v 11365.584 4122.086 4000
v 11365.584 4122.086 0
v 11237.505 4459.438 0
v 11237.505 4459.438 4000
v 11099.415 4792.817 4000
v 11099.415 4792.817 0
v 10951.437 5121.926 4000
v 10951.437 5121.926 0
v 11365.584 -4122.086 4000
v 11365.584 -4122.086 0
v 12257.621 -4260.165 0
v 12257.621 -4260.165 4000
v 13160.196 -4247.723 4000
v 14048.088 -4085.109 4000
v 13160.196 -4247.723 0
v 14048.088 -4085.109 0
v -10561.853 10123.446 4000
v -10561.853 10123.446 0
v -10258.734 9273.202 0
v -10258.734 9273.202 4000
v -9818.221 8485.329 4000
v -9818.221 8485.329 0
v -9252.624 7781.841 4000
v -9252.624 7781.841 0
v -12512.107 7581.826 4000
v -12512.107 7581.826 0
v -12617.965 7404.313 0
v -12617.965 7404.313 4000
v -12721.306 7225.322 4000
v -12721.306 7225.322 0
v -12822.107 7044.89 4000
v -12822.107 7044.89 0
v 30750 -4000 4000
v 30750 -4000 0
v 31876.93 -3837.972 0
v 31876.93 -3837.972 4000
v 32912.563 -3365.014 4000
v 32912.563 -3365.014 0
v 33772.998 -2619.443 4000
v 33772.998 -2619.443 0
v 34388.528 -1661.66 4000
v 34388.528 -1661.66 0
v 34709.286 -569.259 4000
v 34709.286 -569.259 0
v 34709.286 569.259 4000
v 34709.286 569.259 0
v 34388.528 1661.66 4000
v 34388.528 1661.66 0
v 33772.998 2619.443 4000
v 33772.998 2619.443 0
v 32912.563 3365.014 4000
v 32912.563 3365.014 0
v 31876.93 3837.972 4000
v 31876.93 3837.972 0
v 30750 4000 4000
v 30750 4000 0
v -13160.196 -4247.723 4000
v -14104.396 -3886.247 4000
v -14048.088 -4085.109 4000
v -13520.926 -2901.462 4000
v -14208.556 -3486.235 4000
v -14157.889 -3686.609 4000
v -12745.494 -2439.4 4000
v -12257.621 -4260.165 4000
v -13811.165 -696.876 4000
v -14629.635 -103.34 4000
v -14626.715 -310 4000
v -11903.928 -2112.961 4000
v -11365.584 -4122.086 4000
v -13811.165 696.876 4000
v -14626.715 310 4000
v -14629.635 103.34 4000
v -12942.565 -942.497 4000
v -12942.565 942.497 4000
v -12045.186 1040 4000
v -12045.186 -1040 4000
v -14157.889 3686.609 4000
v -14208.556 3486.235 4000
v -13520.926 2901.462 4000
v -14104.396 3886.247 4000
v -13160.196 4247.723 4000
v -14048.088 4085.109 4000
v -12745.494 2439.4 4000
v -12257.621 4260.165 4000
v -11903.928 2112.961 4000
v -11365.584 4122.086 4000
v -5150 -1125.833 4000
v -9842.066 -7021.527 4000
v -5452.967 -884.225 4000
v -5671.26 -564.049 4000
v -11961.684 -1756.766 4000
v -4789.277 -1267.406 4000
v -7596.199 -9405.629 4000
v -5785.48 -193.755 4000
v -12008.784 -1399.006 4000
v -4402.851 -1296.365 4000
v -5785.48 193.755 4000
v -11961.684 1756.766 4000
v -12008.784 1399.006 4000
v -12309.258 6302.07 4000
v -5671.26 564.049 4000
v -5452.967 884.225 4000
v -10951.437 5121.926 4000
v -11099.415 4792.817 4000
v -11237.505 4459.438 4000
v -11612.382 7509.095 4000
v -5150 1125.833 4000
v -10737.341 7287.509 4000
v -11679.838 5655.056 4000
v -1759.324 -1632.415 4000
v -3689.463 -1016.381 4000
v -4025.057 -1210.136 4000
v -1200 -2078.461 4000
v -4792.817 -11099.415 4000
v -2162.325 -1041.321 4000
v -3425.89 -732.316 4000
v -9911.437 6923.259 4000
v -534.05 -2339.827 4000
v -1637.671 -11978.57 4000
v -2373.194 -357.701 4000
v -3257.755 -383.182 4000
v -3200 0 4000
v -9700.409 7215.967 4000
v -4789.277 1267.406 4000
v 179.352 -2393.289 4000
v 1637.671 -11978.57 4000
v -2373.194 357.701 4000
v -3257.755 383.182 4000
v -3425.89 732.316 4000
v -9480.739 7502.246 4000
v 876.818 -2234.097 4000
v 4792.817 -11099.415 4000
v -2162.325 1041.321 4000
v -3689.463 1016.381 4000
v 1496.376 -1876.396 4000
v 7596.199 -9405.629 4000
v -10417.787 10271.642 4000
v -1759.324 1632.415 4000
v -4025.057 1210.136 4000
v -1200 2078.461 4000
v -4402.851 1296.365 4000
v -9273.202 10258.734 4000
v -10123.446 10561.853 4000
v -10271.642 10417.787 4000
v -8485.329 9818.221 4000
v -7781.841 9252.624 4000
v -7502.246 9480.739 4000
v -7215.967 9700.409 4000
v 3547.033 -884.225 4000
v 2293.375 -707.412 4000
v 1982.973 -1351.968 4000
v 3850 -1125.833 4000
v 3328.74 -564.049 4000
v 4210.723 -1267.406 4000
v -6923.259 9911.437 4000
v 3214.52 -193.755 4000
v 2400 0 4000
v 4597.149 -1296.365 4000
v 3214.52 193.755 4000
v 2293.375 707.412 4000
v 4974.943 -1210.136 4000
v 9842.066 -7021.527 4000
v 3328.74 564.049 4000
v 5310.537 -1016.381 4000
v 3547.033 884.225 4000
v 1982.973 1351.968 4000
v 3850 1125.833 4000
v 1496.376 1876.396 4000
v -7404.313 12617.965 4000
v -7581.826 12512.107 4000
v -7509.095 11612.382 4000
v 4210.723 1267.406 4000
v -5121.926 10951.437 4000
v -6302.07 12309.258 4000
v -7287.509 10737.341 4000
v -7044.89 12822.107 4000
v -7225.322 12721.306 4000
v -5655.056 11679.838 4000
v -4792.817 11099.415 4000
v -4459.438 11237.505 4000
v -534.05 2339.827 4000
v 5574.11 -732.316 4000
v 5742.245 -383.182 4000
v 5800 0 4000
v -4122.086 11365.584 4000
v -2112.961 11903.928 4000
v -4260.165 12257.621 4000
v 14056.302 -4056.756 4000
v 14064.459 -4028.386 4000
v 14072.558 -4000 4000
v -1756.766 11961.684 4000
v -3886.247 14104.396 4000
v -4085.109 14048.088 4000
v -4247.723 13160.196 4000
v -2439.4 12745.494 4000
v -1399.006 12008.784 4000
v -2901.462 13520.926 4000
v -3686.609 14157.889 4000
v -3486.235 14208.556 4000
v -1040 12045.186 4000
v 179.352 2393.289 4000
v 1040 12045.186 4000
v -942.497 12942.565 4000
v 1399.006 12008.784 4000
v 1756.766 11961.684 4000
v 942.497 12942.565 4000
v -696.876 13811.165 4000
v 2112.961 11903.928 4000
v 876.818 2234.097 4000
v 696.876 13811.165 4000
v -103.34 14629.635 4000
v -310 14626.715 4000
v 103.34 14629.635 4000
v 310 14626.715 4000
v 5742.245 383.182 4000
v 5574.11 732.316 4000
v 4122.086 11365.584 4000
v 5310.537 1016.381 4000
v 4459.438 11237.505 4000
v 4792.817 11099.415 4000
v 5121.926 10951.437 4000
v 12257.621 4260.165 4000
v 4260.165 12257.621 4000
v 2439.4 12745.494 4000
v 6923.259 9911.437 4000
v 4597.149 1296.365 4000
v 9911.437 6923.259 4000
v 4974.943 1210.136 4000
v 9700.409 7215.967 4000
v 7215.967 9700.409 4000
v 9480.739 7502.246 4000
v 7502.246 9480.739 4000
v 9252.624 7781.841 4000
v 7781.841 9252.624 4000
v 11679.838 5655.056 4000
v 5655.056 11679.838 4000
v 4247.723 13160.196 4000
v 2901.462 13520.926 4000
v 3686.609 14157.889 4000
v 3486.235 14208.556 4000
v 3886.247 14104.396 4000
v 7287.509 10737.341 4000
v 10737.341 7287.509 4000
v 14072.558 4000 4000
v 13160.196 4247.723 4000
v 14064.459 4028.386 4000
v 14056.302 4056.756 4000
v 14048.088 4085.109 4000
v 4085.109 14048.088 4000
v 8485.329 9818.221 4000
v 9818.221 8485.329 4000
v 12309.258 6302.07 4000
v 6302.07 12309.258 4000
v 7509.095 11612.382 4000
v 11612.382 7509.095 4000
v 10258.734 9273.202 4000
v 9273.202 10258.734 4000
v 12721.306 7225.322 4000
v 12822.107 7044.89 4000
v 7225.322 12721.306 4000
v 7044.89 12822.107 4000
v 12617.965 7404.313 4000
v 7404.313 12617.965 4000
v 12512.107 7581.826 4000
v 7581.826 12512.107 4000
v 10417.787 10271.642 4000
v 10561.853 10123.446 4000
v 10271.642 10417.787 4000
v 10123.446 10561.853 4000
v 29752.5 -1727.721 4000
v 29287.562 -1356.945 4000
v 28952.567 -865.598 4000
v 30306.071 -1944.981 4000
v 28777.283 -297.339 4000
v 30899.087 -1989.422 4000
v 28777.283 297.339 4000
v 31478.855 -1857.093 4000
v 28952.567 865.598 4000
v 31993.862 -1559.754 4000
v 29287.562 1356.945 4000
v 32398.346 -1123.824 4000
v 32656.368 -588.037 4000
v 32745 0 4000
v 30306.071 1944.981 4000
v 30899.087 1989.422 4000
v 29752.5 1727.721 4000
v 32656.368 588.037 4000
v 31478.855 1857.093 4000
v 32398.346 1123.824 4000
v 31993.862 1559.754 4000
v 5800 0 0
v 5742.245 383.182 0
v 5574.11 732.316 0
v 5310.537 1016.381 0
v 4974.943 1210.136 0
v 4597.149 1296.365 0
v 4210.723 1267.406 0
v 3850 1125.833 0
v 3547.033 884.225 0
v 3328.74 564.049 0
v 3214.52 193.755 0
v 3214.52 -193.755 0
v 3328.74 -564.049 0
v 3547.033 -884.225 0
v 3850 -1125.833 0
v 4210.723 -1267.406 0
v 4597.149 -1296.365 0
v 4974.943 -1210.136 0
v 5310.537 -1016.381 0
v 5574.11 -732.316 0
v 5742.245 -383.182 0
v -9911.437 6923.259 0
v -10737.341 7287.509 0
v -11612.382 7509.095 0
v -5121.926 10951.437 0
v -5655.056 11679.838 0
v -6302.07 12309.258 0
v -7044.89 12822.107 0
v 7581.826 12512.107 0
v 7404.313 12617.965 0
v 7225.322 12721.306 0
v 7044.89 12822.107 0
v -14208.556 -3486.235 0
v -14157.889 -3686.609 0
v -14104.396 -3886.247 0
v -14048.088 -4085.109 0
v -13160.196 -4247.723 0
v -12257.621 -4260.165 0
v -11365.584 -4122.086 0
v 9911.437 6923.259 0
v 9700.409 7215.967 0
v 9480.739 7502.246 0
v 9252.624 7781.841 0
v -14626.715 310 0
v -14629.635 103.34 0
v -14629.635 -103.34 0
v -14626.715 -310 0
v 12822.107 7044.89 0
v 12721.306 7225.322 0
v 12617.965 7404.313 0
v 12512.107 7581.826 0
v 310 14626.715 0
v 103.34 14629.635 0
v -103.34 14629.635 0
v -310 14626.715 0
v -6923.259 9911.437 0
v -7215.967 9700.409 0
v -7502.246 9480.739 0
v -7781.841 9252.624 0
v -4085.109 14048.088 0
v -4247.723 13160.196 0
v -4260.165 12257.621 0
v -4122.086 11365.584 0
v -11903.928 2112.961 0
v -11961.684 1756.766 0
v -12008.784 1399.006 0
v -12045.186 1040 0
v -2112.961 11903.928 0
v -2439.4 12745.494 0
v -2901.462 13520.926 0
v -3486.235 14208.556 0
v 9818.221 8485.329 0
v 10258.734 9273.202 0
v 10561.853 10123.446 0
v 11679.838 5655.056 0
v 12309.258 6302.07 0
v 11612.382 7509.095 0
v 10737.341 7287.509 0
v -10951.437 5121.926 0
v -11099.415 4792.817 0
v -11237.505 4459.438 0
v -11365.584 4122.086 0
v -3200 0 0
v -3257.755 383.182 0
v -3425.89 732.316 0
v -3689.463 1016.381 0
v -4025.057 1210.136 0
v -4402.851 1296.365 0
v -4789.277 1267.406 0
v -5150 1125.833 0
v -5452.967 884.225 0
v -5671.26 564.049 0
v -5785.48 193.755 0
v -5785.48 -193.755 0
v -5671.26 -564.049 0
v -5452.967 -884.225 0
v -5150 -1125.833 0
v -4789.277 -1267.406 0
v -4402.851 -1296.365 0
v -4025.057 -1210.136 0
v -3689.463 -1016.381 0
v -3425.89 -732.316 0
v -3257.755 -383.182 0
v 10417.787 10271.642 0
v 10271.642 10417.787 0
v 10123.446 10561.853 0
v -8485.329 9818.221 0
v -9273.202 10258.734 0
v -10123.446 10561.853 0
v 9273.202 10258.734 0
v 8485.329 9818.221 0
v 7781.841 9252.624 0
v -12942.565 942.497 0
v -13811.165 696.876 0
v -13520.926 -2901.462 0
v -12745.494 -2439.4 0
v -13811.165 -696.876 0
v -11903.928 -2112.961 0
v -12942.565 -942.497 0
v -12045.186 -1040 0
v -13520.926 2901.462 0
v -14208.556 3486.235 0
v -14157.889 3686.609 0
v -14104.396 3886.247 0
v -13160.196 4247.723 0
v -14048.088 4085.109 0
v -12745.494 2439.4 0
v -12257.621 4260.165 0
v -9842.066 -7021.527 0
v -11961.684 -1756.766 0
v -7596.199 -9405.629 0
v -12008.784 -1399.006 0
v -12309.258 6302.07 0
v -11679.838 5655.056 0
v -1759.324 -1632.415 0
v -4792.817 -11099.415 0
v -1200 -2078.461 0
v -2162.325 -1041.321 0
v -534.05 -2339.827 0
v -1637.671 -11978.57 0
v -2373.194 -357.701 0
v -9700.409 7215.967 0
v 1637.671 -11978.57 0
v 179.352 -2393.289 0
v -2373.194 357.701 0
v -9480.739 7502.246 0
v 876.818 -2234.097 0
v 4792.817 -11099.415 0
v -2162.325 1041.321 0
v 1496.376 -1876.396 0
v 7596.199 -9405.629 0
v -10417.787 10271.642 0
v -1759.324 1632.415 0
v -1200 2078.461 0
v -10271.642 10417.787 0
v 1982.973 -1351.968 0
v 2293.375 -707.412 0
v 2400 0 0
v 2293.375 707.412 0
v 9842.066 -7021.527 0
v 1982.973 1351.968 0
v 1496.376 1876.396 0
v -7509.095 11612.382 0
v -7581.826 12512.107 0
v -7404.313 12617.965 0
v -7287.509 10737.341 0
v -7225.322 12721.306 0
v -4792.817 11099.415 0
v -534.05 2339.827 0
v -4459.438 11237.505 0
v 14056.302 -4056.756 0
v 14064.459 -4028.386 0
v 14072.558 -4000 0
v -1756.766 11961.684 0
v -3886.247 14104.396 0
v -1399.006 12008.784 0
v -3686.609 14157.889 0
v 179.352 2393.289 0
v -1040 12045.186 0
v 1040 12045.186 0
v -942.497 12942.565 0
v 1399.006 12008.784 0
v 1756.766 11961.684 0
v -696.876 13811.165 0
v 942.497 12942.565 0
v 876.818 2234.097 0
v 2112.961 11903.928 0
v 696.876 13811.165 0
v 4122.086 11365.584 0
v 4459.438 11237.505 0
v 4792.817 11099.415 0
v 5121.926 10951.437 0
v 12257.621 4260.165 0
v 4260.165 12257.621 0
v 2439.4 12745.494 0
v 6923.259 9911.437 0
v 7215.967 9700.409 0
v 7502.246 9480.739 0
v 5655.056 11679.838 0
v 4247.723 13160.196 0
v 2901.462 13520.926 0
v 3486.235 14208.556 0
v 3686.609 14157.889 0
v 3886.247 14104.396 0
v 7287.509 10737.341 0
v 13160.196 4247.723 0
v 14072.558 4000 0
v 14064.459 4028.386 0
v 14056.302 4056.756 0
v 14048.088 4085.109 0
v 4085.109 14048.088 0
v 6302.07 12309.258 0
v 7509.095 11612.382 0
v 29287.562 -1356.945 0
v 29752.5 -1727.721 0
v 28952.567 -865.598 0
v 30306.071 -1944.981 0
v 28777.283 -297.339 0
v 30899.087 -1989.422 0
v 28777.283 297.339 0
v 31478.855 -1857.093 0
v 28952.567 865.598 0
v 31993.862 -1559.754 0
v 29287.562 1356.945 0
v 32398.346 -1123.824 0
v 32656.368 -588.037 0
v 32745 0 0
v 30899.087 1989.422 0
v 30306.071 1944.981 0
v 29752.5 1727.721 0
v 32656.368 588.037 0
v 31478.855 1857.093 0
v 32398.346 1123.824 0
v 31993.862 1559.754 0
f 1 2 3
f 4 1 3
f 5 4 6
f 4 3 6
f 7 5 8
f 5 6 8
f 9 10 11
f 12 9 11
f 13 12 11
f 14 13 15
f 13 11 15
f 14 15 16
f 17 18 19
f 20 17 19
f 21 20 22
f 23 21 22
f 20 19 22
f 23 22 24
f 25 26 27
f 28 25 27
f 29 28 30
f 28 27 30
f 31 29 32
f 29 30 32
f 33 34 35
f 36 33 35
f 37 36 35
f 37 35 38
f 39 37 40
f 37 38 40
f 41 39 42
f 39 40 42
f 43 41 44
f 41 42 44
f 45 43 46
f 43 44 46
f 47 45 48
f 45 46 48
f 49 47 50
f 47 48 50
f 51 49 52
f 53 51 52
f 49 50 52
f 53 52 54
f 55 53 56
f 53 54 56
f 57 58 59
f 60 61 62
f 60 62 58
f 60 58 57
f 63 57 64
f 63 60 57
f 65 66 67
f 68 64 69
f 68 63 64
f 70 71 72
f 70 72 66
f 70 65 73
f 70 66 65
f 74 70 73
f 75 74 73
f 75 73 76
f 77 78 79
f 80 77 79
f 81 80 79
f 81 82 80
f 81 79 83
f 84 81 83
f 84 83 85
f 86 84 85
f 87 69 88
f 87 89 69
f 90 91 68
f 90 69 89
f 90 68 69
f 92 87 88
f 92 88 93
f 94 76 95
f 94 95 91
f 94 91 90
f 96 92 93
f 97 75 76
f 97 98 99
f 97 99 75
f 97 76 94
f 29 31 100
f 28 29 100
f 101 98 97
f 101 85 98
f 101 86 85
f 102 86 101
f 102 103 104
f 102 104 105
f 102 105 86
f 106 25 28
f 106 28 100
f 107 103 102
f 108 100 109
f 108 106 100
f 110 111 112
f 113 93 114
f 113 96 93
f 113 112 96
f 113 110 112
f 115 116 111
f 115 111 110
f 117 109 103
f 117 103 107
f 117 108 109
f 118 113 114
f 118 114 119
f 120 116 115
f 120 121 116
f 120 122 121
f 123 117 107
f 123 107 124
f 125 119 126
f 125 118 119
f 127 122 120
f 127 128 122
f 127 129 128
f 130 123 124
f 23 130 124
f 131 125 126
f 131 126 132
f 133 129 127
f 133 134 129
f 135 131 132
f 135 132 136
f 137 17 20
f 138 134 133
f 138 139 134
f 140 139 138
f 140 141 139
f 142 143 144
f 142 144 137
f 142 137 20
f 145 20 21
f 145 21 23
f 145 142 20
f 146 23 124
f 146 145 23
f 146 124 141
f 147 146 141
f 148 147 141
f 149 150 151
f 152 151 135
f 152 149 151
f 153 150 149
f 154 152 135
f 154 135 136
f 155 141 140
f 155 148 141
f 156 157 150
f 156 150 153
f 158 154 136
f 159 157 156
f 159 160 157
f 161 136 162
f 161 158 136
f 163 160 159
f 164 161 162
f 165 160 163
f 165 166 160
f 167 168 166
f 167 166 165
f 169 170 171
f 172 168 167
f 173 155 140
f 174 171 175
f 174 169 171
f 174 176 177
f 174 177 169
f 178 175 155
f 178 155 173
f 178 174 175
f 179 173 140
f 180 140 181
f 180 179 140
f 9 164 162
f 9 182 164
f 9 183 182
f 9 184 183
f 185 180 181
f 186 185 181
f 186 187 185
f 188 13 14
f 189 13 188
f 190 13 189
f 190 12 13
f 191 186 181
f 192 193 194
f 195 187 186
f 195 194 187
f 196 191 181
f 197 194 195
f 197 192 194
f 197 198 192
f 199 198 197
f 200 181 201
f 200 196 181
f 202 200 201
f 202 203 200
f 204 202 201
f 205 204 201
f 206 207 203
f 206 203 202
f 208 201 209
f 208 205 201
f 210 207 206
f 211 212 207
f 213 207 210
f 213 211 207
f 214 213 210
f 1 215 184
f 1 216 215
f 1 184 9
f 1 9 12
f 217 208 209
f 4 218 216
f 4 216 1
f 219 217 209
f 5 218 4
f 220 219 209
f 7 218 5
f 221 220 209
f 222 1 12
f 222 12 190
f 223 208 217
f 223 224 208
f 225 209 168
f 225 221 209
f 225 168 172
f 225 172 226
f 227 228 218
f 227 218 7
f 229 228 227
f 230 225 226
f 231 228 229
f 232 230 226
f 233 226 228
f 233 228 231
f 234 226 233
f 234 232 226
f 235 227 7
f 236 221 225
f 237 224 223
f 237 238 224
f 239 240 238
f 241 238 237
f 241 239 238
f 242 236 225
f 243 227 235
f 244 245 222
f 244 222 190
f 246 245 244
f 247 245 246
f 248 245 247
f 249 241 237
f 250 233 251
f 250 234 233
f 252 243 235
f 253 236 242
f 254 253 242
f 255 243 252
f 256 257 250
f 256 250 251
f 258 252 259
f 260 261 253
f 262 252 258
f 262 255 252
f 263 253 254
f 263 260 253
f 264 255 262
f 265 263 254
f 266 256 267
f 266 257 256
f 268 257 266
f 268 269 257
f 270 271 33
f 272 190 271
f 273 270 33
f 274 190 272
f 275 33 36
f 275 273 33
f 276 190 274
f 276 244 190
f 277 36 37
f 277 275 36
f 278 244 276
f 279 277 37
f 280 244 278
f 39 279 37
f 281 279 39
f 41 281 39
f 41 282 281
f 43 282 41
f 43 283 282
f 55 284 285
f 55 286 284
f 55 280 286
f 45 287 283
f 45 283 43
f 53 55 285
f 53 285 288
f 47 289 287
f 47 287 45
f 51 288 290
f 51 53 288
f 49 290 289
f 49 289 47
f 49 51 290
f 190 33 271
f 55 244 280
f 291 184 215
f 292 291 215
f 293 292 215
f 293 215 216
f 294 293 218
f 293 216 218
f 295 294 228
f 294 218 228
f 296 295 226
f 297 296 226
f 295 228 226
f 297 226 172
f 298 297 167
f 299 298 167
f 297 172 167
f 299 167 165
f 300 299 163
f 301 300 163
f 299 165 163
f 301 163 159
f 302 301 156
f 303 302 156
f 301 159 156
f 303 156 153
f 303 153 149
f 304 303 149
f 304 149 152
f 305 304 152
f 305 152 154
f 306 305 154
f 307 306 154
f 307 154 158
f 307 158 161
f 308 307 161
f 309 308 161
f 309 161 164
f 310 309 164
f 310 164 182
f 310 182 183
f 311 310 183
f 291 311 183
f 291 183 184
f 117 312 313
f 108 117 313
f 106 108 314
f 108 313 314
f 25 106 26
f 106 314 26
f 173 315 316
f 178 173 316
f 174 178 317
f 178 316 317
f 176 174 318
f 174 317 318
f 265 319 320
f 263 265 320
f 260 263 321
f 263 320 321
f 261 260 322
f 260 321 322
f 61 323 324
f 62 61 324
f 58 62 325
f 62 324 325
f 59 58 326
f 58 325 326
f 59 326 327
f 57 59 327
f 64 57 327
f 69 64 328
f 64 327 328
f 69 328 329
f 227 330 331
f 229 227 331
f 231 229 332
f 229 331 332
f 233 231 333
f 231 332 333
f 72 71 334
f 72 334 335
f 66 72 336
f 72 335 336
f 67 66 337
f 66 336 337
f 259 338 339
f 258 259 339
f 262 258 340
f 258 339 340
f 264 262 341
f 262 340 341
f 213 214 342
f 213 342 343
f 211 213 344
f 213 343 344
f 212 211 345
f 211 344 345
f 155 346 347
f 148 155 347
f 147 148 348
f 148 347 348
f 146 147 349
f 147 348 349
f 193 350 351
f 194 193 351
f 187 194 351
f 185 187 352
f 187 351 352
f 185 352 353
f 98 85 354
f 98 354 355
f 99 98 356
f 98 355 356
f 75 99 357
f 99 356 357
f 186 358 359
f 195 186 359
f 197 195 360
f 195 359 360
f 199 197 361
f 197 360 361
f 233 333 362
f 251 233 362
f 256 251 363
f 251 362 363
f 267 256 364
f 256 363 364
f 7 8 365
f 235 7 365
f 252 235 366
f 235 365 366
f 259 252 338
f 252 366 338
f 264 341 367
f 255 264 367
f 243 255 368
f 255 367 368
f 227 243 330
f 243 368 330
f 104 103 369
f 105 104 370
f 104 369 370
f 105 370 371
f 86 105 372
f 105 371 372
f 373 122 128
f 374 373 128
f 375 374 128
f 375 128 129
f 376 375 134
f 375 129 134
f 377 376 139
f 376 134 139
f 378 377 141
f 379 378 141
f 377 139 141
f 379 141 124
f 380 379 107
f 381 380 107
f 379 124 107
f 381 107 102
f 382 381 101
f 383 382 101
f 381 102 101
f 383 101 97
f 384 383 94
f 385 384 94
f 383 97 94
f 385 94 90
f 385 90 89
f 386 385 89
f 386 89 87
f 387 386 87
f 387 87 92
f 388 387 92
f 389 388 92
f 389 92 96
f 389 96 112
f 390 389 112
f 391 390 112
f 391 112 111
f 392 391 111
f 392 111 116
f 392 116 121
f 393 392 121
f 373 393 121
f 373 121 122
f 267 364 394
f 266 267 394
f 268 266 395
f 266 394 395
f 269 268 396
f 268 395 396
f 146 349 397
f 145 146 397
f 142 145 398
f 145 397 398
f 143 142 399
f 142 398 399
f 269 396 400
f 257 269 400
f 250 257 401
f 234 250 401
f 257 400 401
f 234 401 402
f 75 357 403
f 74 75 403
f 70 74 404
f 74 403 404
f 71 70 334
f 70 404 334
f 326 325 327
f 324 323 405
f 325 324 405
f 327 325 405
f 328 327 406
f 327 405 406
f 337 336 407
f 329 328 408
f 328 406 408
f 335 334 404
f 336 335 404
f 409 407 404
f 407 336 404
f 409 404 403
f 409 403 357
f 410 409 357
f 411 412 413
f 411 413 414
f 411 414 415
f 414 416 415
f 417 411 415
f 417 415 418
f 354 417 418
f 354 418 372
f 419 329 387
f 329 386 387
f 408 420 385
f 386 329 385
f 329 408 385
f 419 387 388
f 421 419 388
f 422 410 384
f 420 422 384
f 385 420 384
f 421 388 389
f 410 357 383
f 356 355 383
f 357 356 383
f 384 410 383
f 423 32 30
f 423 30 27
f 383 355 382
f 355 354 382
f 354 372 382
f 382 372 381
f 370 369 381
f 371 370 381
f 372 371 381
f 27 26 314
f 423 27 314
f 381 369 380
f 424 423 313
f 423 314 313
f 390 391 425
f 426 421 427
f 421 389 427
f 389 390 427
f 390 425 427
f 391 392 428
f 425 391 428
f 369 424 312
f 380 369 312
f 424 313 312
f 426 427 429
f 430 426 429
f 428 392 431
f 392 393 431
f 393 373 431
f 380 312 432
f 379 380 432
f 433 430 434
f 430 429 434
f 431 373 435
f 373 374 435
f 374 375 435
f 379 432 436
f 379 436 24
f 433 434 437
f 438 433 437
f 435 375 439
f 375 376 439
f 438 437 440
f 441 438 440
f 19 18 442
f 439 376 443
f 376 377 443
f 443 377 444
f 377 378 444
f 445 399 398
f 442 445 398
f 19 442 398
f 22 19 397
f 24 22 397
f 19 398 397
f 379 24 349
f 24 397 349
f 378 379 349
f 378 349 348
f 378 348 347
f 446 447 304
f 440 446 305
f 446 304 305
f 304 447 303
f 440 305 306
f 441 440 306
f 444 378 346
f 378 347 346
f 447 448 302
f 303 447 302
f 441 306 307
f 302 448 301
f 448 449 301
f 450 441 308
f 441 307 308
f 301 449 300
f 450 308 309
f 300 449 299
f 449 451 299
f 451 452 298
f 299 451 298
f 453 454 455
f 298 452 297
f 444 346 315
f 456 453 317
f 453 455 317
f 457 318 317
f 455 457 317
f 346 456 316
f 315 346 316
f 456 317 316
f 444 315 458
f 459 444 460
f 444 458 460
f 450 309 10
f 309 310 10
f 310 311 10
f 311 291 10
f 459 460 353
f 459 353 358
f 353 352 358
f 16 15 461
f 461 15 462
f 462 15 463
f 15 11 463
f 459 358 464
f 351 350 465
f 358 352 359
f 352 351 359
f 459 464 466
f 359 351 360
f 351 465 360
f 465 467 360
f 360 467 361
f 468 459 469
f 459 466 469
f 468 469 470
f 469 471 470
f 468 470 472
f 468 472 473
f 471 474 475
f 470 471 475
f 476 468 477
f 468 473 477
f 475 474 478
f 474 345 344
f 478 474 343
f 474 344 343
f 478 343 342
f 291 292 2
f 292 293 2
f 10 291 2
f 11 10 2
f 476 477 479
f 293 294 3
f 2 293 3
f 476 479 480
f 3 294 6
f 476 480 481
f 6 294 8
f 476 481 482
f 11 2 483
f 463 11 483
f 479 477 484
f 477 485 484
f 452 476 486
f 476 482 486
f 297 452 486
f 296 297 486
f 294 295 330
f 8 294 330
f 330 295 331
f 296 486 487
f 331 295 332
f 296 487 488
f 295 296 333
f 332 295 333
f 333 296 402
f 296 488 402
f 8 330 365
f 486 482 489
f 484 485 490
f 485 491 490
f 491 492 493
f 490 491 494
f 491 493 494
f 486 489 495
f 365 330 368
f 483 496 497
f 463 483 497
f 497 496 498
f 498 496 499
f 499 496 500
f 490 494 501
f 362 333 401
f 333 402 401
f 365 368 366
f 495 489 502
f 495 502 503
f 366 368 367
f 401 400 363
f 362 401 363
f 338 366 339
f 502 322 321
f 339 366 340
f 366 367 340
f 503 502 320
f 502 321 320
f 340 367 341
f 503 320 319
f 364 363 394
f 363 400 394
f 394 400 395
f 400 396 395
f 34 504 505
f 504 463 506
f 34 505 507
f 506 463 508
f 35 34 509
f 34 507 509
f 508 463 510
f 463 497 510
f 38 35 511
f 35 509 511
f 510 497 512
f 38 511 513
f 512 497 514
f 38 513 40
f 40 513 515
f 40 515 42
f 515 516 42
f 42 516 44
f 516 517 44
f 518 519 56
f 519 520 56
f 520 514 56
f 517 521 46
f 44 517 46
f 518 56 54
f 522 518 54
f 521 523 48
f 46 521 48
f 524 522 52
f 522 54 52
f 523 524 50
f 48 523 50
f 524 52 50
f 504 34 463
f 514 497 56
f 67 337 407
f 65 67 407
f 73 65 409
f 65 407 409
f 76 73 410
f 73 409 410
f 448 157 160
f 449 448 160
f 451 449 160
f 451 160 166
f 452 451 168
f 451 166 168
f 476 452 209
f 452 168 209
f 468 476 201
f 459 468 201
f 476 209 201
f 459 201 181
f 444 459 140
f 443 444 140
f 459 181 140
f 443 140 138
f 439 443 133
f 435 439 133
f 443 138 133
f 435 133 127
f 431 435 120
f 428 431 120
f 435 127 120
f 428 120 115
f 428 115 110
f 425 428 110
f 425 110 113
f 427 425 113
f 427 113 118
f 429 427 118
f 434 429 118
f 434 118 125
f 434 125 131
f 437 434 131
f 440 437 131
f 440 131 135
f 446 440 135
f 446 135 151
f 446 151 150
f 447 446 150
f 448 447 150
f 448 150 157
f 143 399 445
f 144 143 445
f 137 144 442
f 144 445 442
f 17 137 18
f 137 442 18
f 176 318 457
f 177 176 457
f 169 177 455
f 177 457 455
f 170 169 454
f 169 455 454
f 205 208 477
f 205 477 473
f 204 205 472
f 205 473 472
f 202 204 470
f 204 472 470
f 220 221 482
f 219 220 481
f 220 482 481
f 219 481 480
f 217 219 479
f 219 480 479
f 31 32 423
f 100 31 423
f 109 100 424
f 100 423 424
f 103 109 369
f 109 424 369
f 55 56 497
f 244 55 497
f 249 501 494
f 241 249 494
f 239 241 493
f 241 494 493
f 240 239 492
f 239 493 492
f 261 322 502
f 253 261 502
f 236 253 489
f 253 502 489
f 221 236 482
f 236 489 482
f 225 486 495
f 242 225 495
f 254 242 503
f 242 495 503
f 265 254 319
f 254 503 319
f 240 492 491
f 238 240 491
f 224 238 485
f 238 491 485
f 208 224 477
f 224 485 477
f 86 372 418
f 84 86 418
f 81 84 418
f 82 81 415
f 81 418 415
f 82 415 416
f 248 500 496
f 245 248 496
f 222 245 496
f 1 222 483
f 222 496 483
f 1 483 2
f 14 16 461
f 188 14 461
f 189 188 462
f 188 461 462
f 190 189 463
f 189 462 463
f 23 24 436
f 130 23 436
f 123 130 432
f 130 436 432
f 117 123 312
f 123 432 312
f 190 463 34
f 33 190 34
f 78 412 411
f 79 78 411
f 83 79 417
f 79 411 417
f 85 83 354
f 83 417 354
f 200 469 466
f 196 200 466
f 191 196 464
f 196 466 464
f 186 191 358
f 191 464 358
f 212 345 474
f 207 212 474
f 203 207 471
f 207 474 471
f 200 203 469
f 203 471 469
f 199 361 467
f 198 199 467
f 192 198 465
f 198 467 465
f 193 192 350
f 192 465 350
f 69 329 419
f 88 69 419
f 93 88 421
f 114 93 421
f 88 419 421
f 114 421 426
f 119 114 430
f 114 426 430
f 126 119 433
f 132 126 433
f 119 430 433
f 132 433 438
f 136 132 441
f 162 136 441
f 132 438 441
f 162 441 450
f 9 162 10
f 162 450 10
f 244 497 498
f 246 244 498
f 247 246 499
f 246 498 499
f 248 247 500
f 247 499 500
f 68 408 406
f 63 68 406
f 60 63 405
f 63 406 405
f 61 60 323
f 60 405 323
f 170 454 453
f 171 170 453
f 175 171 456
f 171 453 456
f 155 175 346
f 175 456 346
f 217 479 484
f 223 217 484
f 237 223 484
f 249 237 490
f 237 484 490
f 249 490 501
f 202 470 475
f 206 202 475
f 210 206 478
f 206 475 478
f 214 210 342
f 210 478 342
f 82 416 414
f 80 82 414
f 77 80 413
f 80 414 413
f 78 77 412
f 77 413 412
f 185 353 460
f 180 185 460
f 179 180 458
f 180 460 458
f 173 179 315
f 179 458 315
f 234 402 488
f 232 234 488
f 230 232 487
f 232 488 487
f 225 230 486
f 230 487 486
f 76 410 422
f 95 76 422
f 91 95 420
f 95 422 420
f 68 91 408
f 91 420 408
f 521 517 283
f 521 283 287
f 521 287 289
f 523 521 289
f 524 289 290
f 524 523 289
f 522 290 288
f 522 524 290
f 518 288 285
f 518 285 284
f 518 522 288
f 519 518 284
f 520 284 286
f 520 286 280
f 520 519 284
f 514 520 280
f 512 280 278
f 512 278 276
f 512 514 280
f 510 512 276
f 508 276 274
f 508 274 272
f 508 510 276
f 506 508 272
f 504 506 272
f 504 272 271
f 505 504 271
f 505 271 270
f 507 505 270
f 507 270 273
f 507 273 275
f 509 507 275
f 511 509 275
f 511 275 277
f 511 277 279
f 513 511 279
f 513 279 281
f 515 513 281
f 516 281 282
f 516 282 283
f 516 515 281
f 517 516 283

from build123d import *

# Parameters (mm, degrees)
SKETCH2_R           = 1750
SKETCH2_R_2         = 1995
BOSS_EXTRUDE1_DEPTH = 4000
SKETCH3_R           = 1300
SKETCH3_R_2         = 2400
CUT_EXTRUDE1_DEPTH  = 4001


with BuildPart() as part:
    # Sketch2 → Boss-Extrude1 (new body)
    with BuildSketch(Plane.XY):
        with BuildLine():
            Line((14072.558402792, -4000), (30750, -4000))
            ThreePointArc((30750, -4000), (34750, 0), (30750, 4000))
            Line((30750, 4000), (14072.558402792, 4000))
            ThreePointArc((14072.558402792, 4000), (14060.387670314, 4042.573259754), (14048.088142637, 4085.109488948))
            ThreePointArc((14048.088142637, 4085.109488948), (12709.169027193, 4272.836062793), (11365.584201411, 4122.086335903))
            ThreePointArc((11365.584201411, 4122.086335903), (11169.703548061, 4626.642697294), (10951.436861718, 5121.926460211))
            ThreePointArc((10951.436861718, 5121.926460211), (12008.090957274, 5965.388247475), (12822.10700989, 7044.889766841))
            ThreePointArc((12822.10700989, 7044.889766841), (12669.951657366, 7315), (12512.10700989, 7581.825517187))
            ThreePointArc((12512.10700989, 7581.825517187), (11170.223244387, 7416.617696216), (9911.436861718, 6923.259300083))
            ThreePointArc((9911.436861718, 6923.259300083), (9591.641884121, 7359.925676715), (9252.62358419, 7781.841479322))
            ThreePointArc((9252.62358419, 7781.841479322), (10054.969090182, 8870.045207143), (10561.852665989, 10123.446461653))
            ThreePointArc((10561.852665989, 10123.446461653), (10344.972208759, 10344.972208759), (10123.446461653, 10561.852665989))
            ThreePointArc((10123.446461653, 10561.852665989), (8870.045207143, 10054.969090182), (7781.841479322, 9252.62358419))
            ThreePointArc((7781.841479322, 9252.62358419), (7359.925676715, 9591.641884121), (6923.259300083, 9911.436861718))
            ThreePointArc((6923.259300083, 9911.436861718), (7416.617696216, 11170.223244387), (7581.825517187, 12512.10700989))
            ThreePointArc((7581.825517187, 12512.10700989), (7315, 12669.951657366), (7044.889766841, 12822.10700989))
            ThreePointArc((7044.889766841, 12822.10700989), (5965.388247475, 12008.090957274), (5121.926460211, 10951.436861718))
            ThreePointArc((5121.926460211, 10951.436861718), (4626.642697294, 11169.703548061), (4122.086335903, 11365.584201411))
            ThreePointArc((4122.086335903, 11365.584201411), (4272.836062793, 12709.169027193), (4085.109488948, 14048.088142637))
            ThreePointArc((4085.109488948, 14048.088142637), (3786.52262985, 14131.494838609), (3486.235476649, 14208.555950601))
            ThreePointArc((3486.235476649, 14208.555950601), (2654.199937011, 13142.881269936), (2112.960617221, 11903.927815224))
            ThreePointArc((2112.960617221, 11903.927815224), (1578.06166394, 11986.568374009), (1040, 12045.185760294))
            ThreePointArc((1040, 12045.185760294), (837.867712887, 13382.005943691), (310, 14626.715284027))
            ThreePointArc((310, 14626.715284027), (0, 14630), (-310, 14626.715284027))
            ThreePointArc((-310, 14626.715284027), (-837.867712887, 13382.005943691), (-1040, 12045.185760294))
            ThreePointArc((-1040, 12045.185760294), (-1578.06166394, 11986.568374009), (-2112.960617221, 11903.927815224))
            ThreePointArc((-2112.960617221, 11903.927815224), (-2654.199937011, 13142.881269936), (-3486.235476649, 14208.555950601))
            ThreePointArc((-3486.235476649, 14208.555950601), (-3786.52262985, 14131.494838609), (-4085.109488948, 14048.088142637))
            ThreePointArc((-4085.109488948, 14048.088142637), (-4272.836062793, 12709.169027193), (-4122.086335903, 11365.584201411))
            ThreePointArc((-4122.086335903, 11365.584201411), (-4626.642697294, 11169.703548061), (-5121.926460211, 10951.436861718))
            ThreePointArc((-5121.926460211, 10951.436861718), (-5965.388247475, 12008.090957274), (-7044.889766841, 12822.10700989))
            ThreePointArc((-7044.889766841, 12822.10700989), (-7315, 12669.951657366), (-7581.825517187, 12512.10700989))
            ThreePointArc((-7581.825517187, 12512.10700989), (-7416.617696216, 11170.223244387), (-6923.259300083, 9911.436861718))
            ThreePointArc((-6923.259300083, 9911.436861718), (-7359.925676715, 9591.641884121), (-7781.841479322, 9252.62358419))
            ThreePointArc((-7781.841479322, 9252.62358419), (-8870.045207143, 10054.969090182), (-10123.446461653, 10561.852665989))
            ThreePointArc((-10123.446461653, 10561.852665989), (-10344.972208759, 10344.972208759), (-10561.852665989, 10123.446461653))
            ThreePointArc((-10561.852665989, 10123.446461653), (-10054.969090182, 8870.045207143), (-9252.62358419, 7781.841479322))
            ThreePointArc((-9252.62358419, 7781.841479322), (-9591.641884121, 7359.925676715), (-9911.436861718, 6923.259300083))
            ThreePointArc((-9911.436861718, 6923.259300083), (-11170.223244387, 7416.617696216), (-12512.10700989, 7581.825517187))
            ThreePointArc((-12512.10700989, 7581.825517187), (-12669.951657366, 7315), (-12822.10700989, 7044.889766841))
            ThreePointArc((-12822.10700989, 7044.889766841), (-12008.090957274, 5965.388247475), (-10951.436861718, 5121.926460211))
            ThreePointArc((-10951.436861718, 5121.926460211), (-11169.703548061, 4626.642697294), (-11365.584201411, 4122.086335903))
            ThreePointArc((-11365.584201411, 4122.086335903), (-12709.169027193, 4272.836062793), (-14048.088142637, 4085.109488948))
            ThreePointArc((-14048.088142637, 4085.109488948), (-14131.494838609, 3786.52262985), (-14208.555950601, 3486.235476649))
            ThreePointArc((-14208.555950601, 3486.235476649), (-13142.881269936, 2654.199937011), (-11903.927815224, 2112.960617221))
            ThreePointArc((-11903.927815224, 2112.960617221), (-11986.568374009, 1578.06166394), (-12045.185760294, 1040))
            ThreePointArc((-12045.185760294, 1040), (-13382.005943691, 837.867712887), (-14626.715284027, 310))
            ThreePointArc((-14626.715284027, 310), (-14630, 0), (-14626.715284027, -310))
            ThreePointArc((-14626.715284027, -310), (-13382.005943691, -837.867712887), (-12045.185760294, -1040))
            ThreePointArc((-12045.185760294, -1040), (-11986.568374009, -1578.06166394), (-11903.927815224, -2112.960617221))
            ThreePointArc((-11903.927815224, -2112.960617221), (-13142.881269936, -2654.199937011), (-14208.555950601, -3486.235476649))
            ThreePointArc((-14208.555950601, -3486.235476649), (-14131.494838609, -3786.52262985), (-14048.088142637, -4085.109488948))
            ThreePointArc((-14048.088142637, -4085.109488948), (-12709.169027193, -4272.836062793), (-11365.584201411, -4122.086335903))
            ThreePointArc((-11365.584201411, -4122.086335903), (0, -12090), (11365.584201411, -4122.086335903))
            ThreePointArc((11365.584201411, -4122.086335903), (12709.169027193, -4272.836062793), (14048.088142637, -4085.109488948))
            ThreePointArc((14048.088142637, -4085.109488948), (14060.387670314, -4042.573259754), (14072.558402792, -4000))
        make_face()
        Circle(SKETCH2_R, mode=Mode.SUBTRACT)
        with Locations((30750, 0)):
            Circle(SKETCH2_R_2, mode=Mode.SUBTRACT)
    extrude(amount=BOSS_EXTRUDE1_DEPTH)

    # Sketch3 → Cut-Extrude1 (cut, through all)
    with BuildSketch(Plane.XY.offset(4000)):
        with Locations((4500, 0)):
            Circle(SKETCH3_R)
        with Locations((-4500, 0)):
            Circle(SKETCH3_R)
        Circle(SKETCH3_R_2)
    extrude(amount=-CUT_EXTRUDE1_DEPTH, mode=Mode.SUBTRACT)


solid = part.part
